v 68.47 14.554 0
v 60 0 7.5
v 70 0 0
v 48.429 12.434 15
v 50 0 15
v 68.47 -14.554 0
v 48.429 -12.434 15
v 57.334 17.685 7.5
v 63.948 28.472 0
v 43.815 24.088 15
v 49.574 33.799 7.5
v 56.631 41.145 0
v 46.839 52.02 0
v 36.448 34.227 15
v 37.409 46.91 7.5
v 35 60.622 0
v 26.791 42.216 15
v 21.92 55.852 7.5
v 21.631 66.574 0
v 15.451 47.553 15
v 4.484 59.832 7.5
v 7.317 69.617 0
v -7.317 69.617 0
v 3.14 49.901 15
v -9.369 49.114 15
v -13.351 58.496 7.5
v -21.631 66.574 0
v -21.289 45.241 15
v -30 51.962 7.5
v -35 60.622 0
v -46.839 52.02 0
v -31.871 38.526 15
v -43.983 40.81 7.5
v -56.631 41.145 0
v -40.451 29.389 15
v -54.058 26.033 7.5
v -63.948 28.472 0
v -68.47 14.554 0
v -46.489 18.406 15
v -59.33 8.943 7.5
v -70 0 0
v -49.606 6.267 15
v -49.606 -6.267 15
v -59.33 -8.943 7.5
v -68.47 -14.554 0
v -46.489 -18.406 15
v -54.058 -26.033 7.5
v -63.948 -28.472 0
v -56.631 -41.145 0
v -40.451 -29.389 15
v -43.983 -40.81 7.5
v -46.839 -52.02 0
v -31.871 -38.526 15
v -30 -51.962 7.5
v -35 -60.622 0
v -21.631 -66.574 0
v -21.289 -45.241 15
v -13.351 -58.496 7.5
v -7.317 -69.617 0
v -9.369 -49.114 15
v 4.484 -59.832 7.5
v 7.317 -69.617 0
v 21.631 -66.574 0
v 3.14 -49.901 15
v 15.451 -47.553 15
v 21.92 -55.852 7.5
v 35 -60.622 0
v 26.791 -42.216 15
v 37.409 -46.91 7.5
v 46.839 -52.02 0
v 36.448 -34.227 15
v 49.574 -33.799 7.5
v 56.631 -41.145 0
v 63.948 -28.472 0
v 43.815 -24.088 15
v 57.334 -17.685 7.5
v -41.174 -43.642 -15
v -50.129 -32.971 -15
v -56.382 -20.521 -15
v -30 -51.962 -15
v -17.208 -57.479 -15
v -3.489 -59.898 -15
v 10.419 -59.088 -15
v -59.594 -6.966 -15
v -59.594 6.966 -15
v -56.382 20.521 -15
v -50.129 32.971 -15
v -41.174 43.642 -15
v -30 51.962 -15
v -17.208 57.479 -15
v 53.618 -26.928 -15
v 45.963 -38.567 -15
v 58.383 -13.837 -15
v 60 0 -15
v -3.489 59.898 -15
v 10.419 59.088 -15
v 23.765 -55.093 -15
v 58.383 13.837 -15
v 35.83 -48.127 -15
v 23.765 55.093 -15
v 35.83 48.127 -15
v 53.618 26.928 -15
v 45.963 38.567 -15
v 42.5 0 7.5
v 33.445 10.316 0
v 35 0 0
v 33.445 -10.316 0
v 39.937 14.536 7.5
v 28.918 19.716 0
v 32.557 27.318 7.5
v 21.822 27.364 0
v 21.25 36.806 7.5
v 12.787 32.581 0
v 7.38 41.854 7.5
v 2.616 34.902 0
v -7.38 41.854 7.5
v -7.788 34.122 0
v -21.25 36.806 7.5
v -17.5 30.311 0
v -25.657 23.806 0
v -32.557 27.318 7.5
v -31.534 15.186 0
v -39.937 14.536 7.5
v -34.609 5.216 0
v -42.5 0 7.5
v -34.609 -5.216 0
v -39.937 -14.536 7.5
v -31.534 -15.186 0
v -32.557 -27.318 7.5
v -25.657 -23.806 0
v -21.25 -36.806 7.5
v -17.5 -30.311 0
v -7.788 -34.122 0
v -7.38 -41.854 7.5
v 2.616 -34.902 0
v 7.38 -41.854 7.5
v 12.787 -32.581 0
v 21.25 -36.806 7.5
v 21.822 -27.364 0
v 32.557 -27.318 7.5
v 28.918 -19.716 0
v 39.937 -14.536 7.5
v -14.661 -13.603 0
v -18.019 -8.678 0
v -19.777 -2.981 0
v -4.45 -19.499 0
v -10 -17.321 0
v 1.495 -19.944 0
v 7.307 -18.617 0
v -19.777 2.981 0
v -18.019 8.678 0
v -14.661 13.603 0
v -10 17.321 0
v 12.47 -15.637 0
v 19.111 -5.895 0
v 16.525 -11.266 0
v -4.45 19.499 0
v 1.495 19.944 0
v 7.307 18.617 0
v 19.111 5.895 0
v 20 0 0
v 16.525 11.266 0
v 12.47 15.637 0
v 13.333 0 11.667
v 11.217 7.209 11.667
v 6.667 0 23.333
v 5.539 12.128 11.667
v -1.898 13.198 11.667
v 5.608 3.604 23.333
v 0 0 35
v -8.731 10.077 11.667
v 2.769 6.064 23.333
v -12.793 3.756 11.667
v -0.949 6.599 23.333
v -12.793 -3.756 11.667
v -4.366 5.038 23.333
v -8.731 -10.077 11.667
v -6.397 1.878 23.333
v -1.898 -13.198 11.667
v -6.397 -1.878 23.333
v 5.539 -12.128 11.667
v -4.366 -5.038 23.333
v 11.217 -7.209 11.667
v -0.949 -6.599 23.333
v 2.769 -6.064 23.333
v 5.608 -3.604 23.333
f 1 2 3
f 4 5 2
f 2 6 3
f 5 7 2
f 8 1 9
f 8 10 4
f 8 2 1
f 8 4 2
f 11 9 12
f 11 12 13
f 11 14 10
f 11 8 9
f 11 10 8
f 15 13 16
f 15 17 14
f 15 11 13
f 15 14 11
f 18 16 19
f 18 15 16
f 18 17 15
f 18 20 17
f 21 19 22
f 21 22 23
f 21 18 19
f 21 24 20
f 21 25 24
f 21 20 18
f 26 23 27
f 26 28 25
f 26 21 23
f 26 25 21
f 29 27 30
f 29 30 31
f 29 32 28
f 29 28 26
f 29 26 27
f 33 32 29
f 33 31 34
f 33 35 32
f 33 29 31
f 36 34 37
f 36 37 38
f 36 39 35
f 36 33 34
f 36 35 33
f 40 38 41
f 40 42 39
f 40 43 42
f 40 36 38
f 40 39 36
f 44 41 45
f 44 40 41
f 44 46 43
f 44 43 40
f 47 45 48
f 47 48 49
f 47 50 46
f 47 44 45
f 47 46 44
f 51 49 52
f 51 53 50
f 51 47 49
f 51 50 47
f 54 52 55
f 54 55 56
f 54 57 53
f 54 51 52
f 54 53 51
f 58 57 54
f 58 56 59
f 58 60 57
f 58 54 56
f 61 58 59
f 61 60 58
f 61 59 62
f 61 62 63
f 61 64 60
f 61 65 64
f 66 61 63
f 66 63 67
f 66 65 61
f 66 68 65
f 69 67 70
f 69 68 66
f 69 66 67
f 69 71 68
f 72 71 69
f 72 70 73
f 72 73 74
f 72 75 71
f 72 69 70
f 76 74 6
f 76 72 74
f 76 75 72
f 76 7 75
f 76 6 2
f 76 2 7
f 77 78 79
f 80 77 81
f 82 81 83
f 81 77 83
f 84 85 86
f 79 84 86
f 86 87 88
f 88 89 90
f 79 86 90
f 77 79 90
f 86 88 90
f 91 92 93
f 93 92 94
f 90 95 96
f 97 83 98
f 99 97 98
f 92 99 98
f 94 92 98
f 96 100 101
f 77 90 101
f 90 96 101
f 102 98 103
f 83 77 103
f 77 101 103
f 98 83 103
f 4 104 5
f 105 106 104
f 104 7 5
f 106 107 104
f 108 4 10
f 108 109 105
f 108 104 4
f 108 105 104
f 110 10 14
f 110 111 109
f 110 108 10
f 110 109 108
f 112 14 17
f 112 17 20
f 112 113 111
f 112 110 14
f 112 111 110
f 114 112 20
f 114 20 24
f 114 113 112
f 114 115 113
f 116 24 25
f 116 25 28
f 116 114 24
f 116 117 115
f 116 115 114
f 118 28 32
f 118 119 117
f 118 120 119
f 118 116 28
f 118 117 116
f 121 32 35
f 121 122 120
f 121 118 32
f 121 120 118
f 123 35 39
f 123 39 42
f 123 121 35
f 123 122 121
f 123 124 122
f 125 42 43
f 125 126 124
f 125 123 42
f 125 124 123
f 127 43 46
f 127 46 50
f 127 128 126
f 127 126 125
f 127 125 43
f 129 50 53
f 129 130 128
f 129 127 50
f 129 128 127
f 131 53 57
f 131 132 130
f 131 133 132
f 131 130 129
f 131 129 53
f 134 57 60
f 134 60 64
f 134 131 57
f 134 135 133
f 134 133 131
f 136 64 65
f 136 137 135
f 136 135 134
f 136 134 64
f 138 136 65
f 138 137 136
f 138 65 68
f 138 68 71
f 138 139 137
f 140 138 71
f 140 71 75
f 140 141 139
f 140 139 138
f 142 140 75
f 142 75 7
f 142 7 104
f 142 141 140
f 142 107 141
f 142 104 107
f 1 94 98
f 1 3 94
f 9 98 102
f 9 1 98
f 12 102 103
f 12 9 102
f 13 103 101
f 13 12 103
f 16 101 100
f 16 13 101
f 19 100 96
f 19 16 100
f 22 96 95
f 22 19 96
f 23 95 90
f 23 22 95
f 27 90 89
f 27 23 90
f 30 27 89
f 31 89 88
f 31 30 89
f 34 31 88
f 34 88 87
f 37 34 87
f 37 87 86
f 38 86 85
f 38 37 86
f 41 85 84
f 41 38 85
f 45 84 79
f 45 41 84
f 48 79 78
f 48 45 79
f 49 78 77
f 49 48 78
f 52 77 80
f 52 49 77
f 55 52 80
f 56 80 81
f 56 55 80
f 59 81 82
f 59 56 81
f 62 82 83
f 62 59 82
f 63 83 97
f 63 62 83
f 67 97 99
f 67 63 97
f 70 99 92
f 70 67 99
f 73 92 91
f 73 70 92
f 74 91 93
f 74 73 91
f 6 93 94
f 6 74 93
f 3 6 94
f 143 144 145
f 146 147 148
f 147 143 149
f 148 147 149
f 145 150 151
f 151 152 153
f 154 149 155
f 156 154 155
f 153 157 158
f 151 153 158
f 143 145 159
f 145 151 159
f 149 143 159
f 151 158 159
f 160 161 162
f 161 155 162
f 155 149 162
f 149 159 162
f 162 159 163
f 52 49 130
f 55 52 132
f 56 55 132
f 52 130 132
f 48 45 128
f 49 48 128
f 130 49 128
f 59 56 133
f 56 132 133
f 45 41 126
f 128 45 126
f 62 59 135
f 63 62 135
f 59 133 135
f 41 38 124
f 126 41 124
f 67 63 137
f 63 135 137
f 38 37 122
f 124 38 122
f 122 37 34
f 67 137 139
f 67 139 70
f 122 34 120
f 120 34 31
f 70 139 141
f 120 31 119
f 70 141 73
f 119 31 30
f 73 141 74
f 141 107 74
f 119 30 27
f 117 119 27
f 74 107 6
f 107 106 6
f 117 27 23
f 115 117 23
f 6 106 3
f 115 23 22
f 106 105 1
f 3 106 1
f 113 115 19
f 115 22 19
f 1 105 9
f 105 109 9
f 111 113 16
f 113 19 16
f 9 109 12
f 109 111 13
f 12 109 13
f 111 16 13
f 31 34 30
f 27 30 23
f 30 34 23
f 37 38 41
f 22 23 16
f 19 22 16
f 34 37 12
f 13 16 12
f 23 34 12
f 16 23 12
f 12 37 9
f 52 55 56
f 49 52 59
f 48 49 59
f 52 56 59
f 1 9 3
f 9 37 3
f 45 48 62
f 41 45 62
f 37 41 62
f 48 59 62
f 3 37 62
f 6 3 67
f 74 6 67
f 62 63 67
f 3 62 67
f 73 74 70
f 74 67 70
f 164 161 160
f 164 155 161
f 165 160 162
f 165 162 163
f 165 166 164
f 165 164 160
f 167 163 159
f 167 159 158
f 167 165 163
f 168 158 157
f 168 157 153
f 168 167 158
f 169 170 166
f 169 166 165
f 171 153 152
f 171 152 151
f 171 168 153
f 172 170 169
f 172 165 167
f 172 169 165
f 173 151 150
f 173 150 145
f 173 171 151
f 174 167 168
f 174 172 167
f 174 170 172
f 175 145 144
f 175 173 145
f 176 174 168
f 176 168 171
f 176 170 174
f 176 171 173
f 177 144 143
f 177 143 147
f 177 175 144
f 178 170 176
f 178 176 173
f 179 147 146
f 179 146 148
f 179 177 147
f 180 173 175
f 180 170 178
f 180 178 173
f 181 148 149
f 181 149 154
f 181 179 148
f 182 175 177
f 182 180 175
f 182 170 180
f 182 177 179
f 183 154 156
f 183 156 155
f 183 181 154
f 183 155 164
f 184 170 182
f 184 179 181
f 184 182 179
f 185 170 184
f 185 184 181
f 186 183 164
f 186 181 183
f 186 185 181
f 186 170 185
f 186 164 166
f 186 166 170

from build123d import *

# Parameters (mm, degrees)
F0_R       = 70
F2_R       = 50
F5_R       = 60
F3_FACE_R  = 70
F3_FACE1_R = 50
F7_R       = 35
F9_R       = 20


with BuildPart() as f3:
    # F0 (on Top) → F3 section 0
    with BuildSketch(Plane.XY):
        Circle(F0_R)
    # F2 (on offset) → F3 section 1
    with BuildSketch(Plane.XY.offset(15)):
        Circle(F2_R)
    loft()

    # F3_face1 (on face) → F8 section 0
    with BuildSketch(Plane.XY.offset(15)):
        Circle(F3_FACE1_R)
    # F7 (on Top) → F8 section 1
    with BuildSketch(Plane.XY):
        Circle(F7_R)
    loft(mode=Mode.SUBTRACT)


with BuildPart() as f6:
    # F5 (on offset) → F6 section 0
    with BuildSketch(Plane.XY.offset(-15)):
        Circle(F5_R)
    # F3_face (on face) → F6 section 1
    with BuildSketch(Plane(origin=(0, 0, 0), x_dir=(1, 0, 0), z_dir=(0, 0, -1))):
        Circle(F3_FACE_R)
    loft()


with BuildPart() as f12:
    # F9 (on Top) → F12 section 0
    with BuildSketch(Plane.XY, mode=Mode.PRIVATE) as f12_s0:
        Circle(F9_R)
    loft([f12_s0.sketch, Vertex(0, 0, 35)])


solid = Compound([f3.part, f6.part, f12.part])
